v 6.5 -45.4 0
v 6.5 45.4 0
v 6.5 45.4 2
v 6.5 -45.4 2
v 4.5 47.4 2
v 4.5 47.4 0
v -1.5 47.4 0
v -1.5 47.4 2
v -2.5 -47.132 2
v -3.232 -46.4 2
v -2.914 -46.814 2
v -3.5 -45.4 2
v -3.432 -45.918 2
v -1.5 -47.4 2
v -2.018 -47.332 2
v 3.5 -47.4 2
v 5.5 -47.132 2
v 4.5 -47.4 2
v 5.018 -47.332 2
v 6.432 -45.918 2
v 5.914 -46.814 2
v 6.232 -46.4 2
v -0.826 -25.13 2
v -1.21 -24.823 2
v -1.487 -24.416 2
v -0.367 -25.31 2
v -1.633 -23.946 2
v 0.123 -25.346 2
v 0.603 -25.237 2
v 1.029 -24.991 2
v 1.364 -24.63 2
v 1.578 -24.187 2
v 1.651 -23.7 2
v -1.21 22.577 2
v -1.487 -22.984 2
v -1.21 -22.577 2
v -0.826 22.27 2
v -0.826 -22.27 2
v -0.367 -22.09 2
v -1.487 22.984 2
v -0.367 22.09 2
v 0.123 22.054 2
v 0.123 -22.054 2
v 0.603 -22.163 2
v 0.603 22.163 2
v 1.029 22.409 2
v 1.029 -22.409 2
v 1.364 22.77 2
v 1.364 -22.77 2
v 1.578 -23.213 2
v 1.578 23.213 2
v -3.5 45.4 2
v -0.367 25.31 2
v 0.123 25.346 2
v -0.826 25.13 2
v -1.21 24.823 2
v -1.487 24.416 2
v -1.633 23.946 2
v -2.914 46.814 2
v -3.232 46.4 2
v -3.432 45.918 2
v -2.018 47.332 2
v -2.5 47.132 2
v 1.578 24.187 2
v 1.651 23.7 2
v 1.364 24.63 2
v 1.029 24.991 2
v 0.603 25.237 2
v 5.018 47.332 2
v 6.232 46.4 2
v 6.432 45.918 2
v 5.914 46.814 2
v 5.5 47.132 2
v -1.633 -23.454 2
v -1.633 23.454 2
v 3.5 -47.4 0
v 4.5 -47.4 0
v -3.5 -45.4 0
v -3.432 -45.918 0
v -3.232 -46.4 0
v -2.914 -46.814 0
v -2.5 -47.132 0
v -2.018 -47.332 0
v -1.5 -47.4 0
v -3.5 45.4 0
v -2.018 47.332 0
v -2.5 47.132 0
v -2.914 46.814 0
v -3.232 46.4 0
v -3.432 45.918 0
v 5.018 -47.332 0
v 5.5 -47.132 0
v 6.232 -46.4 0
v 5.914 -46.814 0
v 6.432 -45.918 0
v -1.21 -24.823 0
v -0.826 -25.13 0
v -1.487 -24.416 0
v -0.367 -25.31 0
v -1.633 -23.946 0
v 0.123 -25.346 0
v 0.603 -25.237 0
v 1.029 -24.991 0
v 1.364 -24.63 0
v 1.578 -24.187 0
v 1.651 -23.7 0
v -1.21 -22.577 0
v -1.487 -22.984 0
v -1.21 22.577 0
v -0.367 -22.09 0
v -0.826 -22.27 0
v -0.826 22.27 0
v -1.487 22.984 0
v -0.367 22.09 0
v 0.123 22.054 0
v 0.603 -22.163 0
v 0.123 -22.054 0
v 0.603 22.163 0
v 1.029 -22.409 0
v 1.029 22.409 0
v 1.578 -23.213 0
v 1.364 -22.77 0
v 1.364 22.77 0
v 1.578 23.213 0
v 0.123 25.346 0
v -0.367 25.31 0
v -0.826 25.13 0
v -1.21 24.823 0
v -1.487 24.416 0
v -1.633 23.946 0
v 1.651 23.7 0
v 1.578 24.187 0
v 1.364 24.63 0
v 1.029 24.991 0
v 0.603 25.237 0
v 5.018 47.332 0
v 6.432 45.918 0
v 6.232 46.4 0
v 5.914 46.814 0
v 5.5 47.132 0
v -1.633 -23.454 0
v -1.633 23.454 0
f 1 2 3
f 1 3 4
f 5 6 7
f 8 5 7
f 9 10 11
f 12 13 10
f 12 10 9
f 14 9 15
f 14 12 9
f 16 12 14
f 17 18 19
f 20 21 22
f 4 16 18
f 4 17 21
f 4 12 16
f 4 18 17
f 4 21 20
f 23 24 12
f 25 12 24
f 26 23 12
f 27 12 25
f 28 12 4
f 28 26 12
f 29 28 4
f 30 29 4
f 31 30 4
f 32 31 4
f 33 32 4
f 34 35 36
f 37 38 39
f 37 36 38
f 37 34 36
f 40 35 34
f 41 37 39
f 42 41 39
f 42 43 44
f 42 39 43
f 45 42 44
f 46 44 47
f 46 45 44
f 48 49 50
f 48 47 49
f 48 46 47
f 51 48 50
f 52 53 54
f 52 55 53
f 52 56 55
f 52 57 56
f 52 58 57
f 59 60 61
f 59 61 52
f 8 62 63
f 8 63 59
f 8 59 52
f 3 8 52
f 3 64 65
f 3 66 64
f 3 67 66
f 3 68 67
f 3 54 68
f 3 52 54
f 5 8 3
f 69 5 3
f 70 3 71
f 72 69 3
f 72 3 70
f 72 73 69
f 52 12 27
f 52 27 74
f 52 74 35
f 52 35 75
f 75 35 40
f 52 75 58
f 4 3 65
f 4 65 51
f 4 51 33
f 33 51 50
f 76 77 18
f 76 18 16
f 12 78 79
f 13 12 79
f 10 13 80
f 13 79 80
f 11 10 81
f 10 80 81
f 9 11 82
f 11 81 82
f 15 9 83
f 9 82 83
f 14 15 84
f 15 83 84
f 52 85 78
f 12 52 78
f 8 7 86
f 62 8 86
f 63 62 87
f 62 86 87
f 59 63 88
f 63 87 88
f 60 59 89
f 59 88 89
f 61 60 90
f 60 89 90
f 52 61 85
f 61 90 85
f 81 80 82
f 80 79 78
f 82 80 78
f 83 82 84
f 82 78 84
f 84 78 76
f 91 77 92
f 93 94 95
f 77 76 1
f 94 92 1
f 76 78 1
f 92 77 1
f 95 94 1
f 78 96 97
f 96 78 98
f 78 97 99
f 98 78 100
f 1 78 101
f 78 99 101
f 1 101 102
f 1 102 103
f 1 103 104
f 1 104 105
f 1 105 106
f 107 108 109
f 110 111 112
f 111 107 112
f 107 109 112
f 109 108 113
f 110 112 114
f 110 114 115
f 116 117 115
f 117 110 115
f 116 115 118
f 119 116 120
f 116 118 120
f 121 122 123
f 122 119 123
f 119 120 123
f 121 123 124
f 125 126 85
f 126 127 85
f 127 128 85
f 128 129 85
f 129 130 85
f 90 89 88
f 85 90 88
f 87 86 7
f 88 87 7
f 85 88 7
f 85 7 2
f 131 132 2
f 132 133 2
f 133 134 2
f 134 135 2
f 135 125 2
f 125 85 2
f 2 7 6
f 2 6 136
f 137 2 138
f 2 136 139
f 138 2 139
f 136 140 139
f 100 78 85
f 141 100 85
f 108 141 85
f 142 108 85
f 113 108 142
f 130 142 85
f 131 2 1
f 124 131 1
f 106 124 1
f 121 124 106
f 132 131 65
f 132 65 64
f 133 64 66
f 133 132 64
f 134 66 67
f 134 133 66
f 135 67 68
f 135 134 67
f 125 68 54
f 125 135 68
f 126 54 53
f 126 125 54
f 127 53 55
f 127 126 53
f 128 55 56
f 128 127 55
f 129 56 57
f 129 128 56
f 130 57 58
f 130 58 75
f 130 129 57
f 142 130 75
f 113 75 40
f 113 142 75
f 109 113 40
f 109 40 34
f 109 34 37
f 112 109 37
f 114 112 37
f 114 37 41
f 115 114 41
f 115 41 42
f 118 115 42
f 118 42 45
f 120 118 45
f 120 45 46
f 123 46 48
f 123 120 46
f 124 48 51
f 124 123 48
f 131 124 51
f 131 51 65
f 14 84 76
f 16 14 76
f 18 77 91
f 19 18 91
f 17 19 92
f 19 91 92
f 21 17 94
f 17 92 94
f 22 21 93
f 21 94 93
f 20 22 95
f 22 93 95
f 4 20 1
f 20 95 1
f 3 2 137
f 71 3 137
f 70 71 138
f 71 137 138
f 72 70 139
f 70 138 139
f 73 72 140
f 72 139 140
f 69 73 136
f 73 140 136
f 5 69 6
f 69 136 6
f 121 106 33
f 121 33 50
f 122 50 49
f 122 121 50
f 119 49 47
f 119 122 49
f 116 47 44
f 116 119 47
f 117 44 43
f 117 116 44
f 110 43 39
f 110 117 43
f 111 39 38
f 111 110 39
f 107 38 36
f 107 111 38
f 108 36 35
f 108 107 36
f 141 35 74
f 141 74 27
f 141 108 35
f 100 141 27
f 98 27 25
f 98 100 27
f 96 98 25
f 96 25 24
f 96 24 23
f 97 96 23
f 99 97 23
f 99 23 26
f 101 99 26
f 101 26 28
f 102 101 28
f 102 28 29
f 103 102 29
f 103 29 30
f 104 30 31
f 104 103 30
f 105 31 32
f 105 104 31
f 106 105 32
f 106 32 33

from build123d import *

# Parameters (mm, degrees)
SKETCH_R  = 1.651
PAD_DEPTH = 2


with BuildPart() as part:
    # Sketch → Pad (new body)
    with BuildSketch(Plane.XY):
        with BuildLine():
            Line((-3.5, 45.4), (-3.5, -45.4))
            ThreePointArc((-3.5, -45.4), (-2.914214, -46.814214), (-1.5, -47.4))
            Line((-1.5, -47.4), (1.5, -47.4))
            Line((1.5, -47.4), (3.5, -47.4))
            Line((4.499988, -47.400006), (3.5, -47.4))
            ThreePointArc((4.499988, -47.400006), (5.914209, -46.814224), (6.5, -45.400006))
            Line((6.5, 45.4), (6.5, -45.400006))
            ThreePointArc((6.5, 45.4), (5.914214, 46.814214), (4.5, 47.4))
            Line((3.5, 47.4), (4.5, 47.4))
            Line((1.5, 47.4), (3.5, 47.4))
            Line((1.5, 47.4), (-1.5, 47.4))
            ThreePointArc((-1.5, 47.4), (-2.914214, 46.814214), (-3.5, 45.4))
        make_face()
        with Locations((0, 23.7)):
            Circle(SKETCH_R, mode=Mode.SUBTRACT)
        with Locations((0, -23.7)):
            Circle(SKETCH_R, mode=Mode.SUBTRACT)
    extrude(amount=PAD_DEPTH)


solid = part.part
